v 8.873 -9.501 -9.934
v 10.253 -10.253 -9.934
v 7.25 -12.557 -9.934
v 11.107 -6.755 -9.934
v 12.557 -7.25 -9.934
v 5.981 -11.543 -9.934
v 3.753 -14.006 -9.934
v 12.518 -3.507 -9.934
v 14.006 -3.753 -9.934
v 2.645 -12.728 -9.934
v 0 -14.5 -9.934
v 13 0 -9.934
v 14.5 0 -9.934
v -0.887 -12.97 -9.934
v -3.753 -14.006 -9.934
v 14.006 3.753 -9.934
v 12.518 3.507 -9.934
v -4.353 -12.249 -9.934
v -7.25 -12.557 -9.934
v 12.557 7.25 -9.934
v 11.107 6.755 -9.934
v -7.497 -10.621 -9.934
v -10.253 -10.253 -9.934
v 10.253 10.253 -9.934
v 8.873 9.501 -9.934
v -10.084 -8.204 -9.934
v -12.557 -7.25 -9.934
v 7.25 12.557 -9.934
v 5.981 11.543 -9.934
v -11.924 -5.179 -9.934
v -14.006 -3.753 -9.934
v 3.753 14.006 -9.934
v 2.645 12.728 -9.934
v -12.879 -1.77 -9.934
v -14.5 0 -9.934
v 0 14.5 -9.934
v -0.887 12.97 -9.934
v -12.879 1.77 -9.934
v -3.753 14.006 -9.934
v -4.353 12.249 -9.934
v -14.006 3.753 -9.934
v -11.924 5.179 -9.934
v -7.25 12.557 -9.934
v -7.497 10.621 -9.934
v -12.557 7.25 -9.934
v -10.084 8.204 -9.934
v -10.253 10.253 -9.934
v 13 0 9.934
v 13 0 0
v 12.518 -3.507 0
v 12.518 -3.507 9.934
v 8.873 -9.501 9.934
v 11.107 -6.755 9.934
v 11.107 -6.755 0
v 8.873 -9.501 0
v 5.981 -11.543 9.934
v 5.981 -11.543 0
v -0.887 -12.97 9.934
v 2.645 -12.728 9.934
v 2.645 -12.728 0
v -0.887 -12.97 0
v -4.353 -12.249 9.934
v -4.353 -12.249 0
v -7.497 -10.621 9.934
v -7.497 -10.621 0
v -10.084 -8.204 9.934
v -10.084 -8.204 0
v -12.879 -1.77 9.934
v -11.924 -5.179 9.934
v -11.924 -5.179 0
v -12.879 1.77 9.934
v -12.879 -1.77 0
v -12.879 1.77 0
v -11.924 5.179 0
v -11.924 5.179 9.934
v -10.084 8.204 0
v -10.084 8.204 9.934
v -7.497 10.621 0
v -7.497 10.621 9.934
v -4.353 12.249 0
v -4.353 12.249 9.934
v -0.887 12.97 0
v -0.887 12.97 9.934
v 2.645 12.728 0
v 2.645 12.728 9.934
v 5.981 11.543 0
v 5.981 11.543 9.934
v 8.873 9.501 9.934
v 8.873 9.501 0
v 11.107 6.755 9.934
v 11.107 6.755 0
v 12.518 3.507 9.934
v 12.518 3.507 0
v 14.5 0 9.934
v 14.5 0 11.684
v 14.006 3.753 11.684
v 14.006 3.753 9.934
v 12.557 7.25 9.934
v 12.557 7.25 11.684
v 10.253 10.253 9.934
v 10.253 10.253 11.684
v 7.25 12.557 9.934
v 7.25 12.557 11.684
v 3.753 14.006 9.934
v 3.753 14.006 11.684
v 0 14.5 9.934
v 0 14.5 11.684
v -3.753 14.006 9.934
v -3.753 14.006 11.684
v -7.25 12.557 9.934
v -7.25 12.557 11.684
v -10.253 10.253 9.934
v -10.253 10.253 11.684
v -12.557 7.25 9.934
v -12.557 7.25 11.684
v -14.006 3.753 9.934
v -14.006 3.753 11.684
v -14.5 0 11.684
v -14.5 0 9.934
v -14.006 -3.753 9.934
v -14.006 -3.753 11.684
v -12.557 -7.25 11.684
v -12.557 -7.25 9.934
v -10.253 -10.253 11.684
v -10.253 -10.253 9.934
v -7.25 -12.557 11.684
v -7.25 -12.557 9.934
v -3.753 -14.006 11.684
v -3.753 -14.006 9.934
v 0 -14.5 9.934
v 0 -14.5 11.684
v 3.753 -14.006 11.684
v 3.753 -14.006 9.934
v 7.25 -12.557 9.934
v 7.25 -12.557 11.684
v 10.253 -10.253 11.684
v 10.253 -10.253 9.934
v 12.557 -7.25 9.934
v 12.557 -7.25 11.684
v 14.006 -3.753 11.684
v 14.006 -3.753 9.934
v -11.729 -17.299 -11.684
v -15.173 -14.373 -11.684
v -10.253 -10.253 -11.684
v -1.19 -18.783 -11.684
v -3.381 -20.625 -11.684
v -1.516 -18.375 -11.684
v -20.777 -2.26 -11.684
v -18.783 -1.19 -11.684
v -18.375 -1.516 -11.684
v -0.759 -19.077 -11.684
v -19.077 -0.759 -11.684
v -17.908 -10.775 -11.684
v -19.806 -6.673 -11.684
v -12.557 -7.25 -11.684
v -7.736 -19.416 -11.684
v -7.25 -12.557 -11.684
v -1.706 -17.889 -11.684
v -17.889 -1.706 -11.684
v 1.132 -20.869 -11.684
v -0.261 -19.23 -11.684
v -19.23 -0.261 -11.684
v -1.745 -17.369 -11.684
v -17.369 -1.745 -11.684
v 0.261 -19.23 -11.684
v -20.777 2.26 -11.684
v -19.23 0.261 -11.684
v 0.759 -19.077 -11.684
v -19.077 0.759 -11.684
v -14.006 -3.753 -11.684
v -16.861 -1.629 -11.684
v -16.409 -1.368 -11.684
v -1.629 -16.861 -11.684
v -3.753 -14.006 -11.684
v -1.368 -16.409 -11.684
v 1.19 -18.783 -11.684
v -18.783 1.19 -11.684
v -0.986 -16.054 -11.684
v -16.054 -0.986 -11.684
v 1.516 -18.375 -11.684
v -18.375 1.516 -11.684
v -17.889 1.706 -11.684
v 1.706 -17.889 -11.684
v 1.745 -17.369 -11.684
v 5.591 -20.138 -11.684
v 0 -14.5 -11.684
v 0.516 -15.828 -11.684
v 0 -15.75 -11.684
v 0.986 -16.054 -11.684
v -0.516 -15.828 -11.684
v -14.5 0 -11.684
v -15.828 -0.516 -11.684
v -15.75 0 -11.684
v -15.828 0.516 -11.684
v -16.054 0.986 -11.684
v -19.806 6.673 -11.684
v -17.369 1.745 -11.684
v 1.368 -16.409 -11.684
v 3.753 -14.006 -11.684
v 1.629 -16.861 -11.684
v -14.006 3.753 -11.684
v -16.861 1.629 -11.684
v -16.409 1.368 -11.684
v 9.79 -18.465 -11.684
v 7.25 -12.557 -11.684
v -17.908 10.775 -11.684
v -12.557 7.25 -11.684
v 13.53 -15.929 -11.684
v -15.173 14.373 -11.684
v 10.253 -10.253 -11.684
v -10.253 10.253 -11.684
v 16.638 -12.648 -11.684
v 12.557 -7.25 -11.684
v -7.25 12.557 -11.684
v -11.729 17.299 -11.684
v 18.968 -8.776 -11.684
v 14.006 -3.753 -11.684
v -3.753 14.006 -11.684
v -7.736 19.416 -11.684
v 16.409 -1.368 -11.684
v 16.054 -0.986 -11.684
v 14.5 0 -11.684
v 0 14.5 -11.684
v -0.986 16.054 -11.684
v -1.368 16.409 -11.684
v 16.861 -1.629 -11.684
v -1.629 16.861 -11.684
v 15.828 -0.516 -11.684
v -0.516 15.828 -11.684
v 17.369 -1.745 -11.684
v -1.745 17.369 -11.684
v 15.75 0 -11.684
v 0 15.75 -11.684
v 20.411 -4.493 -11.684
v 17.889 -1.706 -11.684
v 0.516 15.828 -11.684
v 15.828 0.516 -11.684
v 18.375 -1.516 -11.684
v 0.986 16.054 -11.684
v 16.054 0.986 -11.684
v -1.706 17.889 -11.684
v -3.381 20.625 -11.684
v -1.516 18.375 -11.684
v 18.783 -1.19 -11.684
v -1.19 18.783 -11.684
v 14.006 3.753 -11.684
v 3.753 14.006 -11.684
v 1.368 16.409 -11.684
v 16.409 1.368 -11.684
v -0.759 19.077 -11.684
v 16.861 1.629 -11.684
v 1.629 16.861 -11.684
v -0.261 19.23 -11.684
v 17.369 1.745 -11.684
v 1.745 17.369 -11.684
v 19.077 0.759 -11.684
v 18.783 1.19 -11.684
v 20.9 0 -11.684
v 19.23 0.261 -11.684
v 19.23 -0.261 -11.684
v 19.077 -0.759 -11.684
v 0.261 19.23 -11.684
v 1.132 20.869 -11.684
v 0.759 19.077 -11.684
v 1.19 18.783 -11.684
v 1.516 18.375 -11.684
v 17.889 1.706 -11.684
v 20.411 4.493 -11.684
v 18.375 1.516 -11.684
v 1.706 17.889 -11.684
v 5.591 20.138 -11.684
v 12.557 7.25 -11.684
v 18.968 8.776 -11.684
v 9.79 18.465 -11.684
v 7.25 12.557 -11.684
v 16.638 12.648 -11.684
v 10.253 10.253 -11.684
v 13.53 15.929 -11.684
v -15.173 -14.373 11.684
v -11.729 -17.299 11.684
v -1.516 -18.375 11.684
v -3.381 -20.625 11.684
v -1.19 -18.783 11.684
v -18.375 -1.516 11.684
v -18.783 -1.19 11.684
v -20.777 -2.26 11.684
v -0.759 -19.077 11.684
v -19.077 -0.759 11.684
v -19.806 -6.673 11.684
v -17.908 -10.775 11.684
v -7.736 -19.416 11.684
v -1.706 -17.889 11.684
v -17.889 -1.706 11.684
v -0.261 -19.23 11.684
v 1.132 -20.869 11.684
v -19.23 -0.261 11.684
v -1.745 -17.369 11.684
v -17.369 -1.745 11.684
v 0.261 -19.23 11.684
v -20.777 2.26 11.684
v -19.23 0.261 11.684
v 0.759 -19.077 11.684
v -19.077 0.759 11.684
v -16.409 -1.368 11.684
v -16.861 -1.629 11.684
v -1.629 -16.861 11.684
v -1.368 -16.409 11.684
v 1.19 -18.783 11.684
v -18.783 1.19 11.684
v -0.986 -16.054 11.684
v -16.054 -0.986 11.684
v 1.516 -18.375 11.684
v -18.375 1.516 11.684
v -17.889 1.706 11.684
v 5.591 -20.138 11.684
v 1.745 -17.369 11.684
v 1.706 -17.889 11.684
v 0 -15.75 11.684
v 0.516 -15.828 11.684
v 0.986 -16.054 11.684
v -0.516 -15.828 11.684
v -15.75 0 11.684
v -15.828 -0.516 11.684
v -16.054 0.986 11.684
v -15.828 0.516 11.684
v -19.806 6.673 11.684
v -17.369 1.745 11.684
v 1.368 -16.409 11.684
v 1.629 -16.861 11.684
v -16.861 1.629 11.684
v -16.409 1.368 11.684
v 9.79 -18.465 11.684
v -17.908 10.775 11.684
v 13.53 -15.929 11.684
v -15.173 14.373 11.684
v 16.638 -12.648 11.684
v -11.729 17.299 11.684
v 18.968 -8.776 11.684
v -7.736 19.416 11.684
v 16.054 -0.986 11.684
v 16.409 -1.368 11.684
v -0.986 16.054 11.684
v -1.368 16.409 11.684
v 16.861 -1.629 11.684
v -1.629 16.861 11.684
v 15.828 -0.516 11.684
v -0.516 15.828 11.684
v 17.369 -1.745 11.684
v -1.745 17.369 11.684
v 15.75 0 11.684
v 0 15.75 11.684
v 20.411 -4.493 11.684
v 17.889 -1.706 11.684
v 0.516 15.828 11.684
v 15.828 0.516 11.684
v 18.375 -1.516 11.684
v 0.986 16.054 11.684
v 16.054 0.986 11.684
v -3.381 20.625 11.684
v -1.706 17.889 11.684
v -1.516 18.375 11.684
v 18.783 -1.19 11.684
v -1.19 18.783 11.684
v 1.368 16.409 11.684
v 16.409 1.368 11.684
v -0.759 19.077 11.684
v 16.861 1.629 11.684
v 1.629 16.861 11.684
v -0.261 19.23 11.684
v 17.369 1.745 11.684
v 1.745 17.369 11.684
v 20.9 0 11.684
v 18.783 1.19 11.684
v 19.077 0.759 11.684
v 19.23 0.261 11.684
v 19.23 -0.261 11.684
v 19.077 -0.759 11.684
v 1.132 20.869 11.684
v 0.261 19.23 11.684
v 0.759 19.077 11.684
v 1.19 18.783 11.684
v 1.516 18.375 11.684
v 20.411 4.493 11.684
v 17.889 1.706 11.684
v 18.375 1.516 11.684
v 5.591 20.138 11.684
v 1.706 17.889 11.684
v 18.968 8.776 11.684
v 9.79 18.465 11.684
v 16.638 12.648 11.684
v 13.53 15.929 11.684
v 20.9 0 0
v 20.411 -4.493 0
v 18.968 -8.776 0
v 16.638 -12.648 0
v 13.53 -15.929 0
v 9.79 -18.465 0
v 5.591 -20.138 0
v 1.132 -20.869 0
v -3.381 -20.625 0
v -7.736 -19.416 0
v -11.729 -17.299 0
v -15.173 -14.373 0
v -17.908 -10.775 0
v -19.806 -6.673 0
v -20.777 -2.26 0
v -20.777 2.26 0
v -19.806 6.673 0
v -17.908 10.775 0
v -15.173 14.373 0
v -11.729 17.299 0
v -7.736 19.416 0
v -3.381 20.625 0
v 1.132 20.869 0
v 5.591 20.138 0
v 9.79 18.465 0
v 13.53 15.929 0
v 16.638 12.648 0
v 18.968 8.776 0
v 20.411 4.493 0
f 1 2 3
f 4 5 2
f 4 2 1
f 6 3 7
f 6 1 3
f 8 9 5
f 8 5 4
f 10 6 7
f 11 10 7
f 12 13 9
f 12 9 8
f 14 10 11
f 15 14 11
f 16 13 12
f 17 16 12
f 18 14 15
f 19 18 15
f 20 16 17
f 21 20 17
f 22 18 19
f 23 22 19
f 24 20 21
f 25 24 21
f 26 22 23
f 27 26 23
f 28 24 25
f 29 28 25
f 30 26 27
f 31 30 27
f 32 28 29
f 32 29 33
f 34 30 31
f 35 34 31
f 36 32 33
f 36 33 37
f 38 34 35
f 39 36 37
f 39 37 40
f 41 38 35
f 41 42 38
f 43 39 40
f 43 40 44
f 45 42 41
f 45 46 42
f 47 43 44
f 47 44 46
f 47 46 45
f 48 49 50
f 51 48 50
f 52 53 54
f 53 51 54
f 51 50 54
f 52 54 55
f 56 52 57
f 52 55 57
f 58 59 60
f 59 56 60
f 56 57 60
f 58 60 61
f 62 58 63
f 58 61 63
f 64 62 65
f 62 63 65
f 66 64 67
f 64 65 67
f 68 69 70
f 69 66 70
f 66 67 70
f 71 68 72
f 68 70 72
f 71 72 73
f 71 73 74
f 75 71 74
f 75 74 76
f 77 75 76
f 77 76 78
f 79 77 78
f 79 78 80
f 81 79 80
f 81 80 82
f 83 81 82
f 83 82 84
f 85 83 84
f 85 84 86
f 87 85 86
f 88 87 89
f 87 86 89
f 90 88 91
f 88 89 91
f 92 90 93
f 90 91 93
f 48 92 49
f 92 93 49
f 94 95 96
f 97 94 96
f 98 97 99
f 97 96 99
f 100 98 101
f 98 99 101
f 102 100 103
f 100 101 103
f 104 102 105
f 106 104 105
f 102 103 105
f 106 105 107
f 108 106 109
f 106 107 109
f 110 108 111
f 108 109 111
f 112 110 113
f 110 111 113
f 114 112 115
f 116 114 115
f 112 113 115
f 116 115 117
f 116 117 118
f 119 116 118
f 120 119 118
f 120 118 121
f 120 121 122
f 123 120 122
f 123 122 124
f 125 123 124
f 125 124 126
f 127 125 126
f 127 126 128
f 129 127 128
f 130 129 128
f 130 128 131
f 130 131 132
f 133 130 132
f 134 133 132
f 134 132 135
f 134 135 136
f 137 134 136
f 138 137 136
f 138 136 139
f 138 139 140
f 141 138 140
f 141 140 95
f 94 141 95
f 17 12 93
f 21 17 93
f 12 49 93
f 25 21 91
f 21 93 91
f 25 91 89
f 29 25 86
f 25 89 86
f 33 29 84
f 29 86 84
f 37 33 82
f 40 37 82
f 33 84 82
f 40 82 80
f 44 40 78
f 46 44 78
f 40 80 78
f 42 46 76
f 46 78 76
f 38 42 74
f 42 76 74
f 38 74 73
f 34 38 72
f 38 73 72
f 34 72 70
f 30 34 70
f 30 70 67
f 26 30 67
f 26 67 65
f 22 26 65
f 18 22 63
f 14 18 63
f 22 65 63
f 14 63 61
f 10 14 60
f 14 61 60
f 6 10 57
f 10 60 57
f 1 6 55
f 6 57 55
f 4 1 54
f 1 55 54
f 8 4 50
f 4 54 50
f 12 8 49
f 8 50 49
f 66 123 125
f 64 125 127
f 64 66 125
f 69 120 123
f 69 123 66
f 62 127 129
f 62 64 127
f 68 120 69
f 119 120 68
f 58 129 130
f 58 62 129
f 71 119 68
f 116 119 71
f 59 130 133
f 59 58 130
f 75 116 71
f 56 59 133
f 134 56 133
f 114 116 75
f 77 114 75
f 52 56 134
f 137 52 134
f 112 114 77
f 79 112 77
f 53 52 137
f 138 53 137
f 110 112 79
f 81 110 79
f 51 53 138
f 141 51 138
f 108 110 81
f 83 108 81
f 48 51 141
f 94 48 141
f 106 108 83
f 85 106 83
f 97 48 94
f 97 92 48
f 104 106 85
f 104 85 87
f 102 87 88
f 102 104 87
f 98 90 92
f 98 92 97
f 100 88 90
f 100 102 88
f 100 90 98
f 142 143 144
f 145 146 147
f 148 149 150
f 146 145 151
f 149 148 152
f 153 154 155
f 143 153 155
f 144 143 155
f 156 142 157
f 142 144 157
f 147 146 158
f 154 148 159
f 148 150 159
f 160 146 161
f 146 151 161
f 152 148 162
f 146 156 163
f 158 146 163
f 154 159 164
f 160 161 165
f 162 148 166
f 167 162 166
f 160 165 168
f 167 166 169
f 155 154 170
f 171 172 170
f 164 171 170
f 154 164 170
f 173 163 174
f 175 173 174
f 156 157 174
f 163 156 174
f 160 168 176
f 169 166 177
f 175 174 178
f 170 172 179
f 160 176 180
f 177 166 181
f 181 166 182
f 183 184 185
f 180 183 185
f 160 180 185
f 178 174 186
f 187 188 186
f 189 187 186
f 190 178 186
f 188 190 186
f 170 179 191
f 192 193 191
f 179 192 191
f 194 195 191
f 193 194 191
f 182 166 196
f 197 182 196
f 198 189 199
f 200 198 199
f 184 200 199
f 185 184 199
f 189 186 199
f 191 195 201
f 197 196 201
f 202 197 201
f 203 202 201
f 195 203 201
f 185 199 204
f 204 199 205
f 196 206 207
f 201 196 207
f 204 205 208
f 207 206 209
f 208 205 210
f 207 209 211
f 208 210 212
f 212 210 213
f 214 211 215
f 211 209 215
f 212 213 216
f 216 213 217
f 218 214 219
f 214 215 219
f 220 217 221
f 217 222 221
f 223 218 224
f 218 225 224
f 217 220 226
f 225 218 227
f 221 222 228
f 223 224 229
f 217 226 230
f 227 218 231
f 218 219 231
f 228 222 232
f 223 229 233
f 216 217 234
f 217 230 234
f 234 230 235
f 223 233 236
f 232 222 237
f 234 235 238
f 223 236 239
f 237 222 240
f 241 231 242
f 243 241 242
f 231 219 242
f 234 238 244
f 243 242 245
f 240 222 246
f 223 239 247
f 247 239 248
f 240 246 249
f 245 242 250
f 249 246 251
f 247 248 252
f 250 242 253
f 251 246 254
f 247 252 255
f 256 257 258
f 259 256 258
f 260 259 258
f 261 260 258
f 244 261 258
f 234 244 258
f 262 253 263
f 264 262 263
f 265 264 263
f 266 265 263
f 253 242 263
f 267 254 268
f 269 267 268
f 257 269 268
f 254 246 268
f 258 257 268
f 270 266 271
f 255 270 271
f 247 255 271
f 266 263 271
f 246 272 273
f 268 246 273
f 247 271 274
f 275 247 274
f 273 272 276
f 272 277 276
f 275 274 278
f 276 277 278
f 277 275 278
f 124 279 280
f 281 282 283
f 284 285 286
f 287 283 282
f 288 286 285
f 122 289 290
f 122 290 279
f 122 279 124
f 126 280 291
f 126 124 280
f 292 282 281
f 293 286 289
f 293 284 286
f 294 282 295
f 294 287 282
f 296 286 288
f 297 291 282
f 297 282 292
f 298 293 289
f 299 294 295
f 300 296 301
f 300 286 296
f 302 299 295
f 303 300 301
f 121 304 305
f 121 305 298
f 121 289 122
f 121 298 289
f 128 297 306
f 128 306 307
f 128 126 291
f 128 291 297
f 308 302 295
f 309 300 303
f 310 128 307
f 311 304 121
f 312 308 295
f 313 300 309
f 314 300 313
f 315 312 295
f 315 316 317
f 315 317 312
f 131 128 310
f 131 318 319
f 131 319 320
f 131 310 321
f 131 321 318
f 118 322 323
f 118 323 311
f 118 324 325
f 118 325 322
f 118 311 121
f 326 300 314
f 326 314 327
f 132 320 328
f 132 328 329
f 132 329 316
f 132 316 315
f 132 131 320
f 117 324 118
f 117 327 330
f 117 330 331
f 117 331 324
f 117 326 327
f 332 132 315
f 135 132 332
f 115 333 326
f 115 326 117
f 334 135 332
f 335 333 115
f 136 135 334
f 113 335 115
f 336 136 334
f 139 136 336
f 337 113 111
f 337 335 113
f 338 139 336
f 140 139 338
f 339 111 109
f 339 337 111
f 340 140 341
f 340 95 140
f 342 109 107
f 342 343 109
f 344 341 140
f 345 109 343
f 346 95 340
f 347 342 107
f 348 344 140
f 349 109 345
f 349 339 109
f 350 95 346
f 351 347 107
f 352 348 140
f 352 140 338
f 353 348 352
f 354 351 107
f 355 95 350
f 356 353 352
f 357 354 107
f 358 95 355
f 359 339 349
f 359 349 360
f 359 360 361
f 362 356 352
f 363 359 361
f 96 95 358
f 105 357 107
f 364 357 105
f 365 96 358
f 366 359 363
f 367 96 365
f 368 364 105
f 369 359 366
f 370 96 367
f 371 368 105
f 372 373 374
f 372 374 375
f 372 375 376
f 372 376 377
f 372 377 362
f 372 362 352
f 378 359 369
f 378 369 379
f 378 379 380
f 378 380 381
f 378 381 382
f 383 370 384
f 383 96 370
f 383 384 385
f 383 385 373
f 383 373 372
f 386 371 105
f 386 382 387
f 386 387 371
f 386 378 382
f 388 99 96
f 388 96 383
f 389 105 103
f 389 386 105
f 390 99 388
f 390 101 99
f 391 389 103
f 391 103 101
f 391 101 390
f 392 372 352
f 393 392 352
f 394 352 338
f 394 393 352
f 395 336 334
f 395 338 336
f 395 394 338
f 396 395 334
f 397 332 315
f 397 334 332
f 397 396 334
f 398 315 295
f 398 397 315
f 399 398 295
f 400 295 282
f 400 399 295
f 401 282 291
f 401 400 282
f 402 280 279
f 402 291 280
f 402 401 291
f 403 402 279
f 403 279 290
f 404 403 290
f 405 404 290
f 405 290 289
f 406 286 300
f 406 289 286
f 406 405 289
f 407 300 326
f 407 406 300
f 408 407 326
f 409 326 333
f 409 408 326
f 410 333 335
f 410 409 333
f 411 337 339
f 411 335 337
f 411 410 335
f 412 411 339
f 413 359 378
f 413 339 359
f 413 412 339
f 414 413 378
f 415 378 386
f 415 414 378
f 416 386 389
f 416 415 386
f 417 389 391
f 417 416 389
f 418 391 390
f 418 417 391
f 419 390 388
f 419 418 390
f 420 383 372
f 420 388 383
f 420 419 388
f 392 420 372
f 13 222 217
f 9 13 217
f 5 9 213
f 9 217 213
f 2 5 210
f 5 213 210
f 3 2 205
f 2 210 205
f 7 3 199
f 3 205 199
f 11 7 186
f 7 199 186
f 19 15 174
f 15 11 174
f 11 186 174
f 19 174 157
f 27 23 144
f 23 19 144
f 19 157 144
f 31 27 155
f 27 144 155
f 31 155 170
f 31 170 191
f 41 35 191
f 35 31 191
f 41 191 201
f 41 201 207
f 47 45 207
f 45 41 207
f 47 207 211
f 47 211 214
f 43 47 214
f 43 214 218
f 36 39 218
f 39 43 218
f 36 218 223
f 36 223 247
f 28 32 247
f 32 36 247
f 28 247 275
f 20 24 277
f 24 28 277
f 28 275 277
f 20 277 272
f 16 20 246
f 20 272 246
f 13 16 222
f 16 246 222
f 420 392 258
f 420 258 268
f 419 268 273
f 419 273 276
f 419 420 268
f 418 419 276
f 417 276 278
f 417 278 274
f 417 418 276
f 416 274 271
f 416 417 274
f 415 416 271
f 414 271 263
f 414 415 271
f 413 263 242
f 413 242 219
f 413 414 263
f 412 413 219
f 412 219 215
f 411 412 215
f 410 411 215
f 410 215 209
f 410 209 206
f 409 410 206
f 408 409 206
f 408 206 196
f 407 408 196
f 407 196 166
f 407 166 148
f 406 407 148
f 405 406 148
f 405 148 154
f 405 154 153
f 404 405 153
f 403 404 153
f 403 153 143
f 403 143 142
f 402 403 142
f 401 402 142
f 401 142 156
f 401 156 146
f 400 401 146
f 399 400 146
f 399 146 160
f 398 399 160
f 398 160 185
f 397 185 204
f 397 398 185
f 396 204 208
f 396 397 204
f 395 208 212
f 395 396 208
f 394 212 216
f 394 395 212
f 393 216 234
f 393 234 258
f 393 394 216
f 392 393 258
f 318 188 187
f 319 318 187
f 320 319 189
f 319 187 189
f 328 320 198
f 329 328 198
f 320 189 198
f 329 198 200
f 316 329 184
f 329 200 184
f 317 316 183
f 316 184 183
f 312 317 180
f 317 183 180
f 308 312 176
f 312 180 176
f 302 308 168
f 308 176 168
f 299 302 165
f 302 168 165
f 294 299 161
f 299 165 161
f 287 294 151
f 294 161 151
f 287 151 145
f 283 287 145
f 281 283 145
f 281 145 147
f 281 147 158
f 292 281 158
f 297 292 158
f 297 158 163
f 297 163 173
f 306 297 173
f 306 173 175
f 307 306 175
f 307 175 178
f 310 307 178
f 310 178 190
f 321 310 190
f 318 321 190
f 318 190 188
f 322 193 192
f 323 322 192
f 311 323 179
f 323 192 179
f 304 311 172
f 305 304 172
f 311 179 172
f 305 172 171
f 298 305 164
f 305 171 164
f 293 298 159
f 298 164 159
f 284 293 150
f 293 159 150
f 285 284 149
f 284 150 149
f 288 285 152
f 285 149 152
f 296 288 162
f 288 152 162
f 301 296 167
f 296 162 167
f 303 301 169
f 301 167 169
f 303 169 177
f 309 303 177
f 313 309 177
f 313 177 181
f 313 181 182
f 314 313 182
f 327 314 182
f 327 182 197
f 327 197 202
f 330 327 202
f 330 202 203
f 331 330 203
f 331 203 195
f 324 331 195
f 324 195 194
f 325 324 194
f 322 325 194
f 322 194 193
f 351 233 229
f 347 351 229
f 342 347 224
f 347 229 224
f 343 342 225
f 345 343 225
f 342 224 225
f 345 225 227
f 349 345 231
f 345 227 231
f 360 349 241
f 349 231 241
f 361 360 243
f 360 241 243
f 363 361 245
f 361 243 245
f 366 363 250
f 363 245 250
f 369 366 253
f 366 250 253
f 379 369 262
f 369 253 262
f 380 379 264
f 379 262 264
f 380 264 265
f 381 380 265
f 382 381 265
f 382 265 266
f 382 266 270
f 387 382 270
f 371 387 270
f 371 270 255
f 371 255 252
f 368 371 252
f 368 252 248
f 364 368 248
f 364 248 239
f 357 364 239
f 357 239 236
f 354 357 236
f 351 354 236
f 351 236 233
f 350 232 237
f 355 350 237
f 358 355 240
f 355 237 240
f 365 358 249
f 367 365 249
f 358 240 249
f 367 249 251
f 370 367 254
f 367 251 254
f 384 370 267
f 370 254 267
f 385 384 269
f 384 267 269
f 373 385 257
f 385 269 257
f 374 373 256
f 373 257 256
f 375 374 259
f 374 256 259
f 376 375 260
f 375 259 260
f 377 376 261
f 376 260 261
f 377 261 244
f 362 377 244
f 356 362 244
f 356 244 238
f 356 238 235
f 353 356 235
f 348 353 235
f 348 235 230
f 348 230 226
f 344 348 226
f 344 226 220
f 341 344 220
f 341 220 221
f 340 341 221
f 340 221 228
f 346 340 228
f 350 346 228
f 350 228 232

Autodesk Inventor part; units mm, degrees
ref_plane "YZ Plane" through (0, 0, 0) normal (1, 0, 0) x (0, 1, 0)
ref_plane "XZ Plane" through (0, 0, 0) normal (0, 1, 0) x (-1, 0, 0)
ref_plane "XY Plane" through (0, 0, 0) normal (0, 0, 1) x (1, 0, 0)
sketch "Sketch1" plane through (0, 0, 0) normal (0, 0, 1) x (1, 0, 0)
  circle A0 centre (0, 0) radius 20.9
  circle A1 centre (0, 0) radius 13
  dimension "d0" = 41.8
  dimension "d1" = 26
extrude "Extrusion1" add sketch "Sketch1" along normal mid plane 23.368
sketch "Sketch2" plane through (0, 0, 11.684) normal (0, 0, 1) x (1, 0, 0)
  circle A0 centre (0, 0) radius 13 projected
  point P0 (0, 17.5)
  dimension "d4" = 17.5
hole "Hole1" at (0, 17.5, 11.684) direction (0, 0, -1) diameter 3.5 end through all
pattern_circular "Circular Pattern1" count 4 over 360 about axis through (0, 0, 0) along (0, 0, 1) of "Hole1"
sketch "Sketch3" plane through (0, 0, 11.684) normal (0, 0, 1) x (1, 0, 0)
  circle A0 centre (0, 0) radius 13 projected
  circle A1 centre (0, 0) radius 20.9 projected
  circle A2 centre (0, 0) radius 14.5
  dimension "d15" = 29
extrude "Extrusion2" cut sketch "Sketch3" against normal blind 1.75 contours A2
mirror "Mirror1" about plane through (0, 0, 0) normal (0, 0, 1) of "Extrusion2"
properties part number "BB1-RingGear" material "Aluminum-6061"
